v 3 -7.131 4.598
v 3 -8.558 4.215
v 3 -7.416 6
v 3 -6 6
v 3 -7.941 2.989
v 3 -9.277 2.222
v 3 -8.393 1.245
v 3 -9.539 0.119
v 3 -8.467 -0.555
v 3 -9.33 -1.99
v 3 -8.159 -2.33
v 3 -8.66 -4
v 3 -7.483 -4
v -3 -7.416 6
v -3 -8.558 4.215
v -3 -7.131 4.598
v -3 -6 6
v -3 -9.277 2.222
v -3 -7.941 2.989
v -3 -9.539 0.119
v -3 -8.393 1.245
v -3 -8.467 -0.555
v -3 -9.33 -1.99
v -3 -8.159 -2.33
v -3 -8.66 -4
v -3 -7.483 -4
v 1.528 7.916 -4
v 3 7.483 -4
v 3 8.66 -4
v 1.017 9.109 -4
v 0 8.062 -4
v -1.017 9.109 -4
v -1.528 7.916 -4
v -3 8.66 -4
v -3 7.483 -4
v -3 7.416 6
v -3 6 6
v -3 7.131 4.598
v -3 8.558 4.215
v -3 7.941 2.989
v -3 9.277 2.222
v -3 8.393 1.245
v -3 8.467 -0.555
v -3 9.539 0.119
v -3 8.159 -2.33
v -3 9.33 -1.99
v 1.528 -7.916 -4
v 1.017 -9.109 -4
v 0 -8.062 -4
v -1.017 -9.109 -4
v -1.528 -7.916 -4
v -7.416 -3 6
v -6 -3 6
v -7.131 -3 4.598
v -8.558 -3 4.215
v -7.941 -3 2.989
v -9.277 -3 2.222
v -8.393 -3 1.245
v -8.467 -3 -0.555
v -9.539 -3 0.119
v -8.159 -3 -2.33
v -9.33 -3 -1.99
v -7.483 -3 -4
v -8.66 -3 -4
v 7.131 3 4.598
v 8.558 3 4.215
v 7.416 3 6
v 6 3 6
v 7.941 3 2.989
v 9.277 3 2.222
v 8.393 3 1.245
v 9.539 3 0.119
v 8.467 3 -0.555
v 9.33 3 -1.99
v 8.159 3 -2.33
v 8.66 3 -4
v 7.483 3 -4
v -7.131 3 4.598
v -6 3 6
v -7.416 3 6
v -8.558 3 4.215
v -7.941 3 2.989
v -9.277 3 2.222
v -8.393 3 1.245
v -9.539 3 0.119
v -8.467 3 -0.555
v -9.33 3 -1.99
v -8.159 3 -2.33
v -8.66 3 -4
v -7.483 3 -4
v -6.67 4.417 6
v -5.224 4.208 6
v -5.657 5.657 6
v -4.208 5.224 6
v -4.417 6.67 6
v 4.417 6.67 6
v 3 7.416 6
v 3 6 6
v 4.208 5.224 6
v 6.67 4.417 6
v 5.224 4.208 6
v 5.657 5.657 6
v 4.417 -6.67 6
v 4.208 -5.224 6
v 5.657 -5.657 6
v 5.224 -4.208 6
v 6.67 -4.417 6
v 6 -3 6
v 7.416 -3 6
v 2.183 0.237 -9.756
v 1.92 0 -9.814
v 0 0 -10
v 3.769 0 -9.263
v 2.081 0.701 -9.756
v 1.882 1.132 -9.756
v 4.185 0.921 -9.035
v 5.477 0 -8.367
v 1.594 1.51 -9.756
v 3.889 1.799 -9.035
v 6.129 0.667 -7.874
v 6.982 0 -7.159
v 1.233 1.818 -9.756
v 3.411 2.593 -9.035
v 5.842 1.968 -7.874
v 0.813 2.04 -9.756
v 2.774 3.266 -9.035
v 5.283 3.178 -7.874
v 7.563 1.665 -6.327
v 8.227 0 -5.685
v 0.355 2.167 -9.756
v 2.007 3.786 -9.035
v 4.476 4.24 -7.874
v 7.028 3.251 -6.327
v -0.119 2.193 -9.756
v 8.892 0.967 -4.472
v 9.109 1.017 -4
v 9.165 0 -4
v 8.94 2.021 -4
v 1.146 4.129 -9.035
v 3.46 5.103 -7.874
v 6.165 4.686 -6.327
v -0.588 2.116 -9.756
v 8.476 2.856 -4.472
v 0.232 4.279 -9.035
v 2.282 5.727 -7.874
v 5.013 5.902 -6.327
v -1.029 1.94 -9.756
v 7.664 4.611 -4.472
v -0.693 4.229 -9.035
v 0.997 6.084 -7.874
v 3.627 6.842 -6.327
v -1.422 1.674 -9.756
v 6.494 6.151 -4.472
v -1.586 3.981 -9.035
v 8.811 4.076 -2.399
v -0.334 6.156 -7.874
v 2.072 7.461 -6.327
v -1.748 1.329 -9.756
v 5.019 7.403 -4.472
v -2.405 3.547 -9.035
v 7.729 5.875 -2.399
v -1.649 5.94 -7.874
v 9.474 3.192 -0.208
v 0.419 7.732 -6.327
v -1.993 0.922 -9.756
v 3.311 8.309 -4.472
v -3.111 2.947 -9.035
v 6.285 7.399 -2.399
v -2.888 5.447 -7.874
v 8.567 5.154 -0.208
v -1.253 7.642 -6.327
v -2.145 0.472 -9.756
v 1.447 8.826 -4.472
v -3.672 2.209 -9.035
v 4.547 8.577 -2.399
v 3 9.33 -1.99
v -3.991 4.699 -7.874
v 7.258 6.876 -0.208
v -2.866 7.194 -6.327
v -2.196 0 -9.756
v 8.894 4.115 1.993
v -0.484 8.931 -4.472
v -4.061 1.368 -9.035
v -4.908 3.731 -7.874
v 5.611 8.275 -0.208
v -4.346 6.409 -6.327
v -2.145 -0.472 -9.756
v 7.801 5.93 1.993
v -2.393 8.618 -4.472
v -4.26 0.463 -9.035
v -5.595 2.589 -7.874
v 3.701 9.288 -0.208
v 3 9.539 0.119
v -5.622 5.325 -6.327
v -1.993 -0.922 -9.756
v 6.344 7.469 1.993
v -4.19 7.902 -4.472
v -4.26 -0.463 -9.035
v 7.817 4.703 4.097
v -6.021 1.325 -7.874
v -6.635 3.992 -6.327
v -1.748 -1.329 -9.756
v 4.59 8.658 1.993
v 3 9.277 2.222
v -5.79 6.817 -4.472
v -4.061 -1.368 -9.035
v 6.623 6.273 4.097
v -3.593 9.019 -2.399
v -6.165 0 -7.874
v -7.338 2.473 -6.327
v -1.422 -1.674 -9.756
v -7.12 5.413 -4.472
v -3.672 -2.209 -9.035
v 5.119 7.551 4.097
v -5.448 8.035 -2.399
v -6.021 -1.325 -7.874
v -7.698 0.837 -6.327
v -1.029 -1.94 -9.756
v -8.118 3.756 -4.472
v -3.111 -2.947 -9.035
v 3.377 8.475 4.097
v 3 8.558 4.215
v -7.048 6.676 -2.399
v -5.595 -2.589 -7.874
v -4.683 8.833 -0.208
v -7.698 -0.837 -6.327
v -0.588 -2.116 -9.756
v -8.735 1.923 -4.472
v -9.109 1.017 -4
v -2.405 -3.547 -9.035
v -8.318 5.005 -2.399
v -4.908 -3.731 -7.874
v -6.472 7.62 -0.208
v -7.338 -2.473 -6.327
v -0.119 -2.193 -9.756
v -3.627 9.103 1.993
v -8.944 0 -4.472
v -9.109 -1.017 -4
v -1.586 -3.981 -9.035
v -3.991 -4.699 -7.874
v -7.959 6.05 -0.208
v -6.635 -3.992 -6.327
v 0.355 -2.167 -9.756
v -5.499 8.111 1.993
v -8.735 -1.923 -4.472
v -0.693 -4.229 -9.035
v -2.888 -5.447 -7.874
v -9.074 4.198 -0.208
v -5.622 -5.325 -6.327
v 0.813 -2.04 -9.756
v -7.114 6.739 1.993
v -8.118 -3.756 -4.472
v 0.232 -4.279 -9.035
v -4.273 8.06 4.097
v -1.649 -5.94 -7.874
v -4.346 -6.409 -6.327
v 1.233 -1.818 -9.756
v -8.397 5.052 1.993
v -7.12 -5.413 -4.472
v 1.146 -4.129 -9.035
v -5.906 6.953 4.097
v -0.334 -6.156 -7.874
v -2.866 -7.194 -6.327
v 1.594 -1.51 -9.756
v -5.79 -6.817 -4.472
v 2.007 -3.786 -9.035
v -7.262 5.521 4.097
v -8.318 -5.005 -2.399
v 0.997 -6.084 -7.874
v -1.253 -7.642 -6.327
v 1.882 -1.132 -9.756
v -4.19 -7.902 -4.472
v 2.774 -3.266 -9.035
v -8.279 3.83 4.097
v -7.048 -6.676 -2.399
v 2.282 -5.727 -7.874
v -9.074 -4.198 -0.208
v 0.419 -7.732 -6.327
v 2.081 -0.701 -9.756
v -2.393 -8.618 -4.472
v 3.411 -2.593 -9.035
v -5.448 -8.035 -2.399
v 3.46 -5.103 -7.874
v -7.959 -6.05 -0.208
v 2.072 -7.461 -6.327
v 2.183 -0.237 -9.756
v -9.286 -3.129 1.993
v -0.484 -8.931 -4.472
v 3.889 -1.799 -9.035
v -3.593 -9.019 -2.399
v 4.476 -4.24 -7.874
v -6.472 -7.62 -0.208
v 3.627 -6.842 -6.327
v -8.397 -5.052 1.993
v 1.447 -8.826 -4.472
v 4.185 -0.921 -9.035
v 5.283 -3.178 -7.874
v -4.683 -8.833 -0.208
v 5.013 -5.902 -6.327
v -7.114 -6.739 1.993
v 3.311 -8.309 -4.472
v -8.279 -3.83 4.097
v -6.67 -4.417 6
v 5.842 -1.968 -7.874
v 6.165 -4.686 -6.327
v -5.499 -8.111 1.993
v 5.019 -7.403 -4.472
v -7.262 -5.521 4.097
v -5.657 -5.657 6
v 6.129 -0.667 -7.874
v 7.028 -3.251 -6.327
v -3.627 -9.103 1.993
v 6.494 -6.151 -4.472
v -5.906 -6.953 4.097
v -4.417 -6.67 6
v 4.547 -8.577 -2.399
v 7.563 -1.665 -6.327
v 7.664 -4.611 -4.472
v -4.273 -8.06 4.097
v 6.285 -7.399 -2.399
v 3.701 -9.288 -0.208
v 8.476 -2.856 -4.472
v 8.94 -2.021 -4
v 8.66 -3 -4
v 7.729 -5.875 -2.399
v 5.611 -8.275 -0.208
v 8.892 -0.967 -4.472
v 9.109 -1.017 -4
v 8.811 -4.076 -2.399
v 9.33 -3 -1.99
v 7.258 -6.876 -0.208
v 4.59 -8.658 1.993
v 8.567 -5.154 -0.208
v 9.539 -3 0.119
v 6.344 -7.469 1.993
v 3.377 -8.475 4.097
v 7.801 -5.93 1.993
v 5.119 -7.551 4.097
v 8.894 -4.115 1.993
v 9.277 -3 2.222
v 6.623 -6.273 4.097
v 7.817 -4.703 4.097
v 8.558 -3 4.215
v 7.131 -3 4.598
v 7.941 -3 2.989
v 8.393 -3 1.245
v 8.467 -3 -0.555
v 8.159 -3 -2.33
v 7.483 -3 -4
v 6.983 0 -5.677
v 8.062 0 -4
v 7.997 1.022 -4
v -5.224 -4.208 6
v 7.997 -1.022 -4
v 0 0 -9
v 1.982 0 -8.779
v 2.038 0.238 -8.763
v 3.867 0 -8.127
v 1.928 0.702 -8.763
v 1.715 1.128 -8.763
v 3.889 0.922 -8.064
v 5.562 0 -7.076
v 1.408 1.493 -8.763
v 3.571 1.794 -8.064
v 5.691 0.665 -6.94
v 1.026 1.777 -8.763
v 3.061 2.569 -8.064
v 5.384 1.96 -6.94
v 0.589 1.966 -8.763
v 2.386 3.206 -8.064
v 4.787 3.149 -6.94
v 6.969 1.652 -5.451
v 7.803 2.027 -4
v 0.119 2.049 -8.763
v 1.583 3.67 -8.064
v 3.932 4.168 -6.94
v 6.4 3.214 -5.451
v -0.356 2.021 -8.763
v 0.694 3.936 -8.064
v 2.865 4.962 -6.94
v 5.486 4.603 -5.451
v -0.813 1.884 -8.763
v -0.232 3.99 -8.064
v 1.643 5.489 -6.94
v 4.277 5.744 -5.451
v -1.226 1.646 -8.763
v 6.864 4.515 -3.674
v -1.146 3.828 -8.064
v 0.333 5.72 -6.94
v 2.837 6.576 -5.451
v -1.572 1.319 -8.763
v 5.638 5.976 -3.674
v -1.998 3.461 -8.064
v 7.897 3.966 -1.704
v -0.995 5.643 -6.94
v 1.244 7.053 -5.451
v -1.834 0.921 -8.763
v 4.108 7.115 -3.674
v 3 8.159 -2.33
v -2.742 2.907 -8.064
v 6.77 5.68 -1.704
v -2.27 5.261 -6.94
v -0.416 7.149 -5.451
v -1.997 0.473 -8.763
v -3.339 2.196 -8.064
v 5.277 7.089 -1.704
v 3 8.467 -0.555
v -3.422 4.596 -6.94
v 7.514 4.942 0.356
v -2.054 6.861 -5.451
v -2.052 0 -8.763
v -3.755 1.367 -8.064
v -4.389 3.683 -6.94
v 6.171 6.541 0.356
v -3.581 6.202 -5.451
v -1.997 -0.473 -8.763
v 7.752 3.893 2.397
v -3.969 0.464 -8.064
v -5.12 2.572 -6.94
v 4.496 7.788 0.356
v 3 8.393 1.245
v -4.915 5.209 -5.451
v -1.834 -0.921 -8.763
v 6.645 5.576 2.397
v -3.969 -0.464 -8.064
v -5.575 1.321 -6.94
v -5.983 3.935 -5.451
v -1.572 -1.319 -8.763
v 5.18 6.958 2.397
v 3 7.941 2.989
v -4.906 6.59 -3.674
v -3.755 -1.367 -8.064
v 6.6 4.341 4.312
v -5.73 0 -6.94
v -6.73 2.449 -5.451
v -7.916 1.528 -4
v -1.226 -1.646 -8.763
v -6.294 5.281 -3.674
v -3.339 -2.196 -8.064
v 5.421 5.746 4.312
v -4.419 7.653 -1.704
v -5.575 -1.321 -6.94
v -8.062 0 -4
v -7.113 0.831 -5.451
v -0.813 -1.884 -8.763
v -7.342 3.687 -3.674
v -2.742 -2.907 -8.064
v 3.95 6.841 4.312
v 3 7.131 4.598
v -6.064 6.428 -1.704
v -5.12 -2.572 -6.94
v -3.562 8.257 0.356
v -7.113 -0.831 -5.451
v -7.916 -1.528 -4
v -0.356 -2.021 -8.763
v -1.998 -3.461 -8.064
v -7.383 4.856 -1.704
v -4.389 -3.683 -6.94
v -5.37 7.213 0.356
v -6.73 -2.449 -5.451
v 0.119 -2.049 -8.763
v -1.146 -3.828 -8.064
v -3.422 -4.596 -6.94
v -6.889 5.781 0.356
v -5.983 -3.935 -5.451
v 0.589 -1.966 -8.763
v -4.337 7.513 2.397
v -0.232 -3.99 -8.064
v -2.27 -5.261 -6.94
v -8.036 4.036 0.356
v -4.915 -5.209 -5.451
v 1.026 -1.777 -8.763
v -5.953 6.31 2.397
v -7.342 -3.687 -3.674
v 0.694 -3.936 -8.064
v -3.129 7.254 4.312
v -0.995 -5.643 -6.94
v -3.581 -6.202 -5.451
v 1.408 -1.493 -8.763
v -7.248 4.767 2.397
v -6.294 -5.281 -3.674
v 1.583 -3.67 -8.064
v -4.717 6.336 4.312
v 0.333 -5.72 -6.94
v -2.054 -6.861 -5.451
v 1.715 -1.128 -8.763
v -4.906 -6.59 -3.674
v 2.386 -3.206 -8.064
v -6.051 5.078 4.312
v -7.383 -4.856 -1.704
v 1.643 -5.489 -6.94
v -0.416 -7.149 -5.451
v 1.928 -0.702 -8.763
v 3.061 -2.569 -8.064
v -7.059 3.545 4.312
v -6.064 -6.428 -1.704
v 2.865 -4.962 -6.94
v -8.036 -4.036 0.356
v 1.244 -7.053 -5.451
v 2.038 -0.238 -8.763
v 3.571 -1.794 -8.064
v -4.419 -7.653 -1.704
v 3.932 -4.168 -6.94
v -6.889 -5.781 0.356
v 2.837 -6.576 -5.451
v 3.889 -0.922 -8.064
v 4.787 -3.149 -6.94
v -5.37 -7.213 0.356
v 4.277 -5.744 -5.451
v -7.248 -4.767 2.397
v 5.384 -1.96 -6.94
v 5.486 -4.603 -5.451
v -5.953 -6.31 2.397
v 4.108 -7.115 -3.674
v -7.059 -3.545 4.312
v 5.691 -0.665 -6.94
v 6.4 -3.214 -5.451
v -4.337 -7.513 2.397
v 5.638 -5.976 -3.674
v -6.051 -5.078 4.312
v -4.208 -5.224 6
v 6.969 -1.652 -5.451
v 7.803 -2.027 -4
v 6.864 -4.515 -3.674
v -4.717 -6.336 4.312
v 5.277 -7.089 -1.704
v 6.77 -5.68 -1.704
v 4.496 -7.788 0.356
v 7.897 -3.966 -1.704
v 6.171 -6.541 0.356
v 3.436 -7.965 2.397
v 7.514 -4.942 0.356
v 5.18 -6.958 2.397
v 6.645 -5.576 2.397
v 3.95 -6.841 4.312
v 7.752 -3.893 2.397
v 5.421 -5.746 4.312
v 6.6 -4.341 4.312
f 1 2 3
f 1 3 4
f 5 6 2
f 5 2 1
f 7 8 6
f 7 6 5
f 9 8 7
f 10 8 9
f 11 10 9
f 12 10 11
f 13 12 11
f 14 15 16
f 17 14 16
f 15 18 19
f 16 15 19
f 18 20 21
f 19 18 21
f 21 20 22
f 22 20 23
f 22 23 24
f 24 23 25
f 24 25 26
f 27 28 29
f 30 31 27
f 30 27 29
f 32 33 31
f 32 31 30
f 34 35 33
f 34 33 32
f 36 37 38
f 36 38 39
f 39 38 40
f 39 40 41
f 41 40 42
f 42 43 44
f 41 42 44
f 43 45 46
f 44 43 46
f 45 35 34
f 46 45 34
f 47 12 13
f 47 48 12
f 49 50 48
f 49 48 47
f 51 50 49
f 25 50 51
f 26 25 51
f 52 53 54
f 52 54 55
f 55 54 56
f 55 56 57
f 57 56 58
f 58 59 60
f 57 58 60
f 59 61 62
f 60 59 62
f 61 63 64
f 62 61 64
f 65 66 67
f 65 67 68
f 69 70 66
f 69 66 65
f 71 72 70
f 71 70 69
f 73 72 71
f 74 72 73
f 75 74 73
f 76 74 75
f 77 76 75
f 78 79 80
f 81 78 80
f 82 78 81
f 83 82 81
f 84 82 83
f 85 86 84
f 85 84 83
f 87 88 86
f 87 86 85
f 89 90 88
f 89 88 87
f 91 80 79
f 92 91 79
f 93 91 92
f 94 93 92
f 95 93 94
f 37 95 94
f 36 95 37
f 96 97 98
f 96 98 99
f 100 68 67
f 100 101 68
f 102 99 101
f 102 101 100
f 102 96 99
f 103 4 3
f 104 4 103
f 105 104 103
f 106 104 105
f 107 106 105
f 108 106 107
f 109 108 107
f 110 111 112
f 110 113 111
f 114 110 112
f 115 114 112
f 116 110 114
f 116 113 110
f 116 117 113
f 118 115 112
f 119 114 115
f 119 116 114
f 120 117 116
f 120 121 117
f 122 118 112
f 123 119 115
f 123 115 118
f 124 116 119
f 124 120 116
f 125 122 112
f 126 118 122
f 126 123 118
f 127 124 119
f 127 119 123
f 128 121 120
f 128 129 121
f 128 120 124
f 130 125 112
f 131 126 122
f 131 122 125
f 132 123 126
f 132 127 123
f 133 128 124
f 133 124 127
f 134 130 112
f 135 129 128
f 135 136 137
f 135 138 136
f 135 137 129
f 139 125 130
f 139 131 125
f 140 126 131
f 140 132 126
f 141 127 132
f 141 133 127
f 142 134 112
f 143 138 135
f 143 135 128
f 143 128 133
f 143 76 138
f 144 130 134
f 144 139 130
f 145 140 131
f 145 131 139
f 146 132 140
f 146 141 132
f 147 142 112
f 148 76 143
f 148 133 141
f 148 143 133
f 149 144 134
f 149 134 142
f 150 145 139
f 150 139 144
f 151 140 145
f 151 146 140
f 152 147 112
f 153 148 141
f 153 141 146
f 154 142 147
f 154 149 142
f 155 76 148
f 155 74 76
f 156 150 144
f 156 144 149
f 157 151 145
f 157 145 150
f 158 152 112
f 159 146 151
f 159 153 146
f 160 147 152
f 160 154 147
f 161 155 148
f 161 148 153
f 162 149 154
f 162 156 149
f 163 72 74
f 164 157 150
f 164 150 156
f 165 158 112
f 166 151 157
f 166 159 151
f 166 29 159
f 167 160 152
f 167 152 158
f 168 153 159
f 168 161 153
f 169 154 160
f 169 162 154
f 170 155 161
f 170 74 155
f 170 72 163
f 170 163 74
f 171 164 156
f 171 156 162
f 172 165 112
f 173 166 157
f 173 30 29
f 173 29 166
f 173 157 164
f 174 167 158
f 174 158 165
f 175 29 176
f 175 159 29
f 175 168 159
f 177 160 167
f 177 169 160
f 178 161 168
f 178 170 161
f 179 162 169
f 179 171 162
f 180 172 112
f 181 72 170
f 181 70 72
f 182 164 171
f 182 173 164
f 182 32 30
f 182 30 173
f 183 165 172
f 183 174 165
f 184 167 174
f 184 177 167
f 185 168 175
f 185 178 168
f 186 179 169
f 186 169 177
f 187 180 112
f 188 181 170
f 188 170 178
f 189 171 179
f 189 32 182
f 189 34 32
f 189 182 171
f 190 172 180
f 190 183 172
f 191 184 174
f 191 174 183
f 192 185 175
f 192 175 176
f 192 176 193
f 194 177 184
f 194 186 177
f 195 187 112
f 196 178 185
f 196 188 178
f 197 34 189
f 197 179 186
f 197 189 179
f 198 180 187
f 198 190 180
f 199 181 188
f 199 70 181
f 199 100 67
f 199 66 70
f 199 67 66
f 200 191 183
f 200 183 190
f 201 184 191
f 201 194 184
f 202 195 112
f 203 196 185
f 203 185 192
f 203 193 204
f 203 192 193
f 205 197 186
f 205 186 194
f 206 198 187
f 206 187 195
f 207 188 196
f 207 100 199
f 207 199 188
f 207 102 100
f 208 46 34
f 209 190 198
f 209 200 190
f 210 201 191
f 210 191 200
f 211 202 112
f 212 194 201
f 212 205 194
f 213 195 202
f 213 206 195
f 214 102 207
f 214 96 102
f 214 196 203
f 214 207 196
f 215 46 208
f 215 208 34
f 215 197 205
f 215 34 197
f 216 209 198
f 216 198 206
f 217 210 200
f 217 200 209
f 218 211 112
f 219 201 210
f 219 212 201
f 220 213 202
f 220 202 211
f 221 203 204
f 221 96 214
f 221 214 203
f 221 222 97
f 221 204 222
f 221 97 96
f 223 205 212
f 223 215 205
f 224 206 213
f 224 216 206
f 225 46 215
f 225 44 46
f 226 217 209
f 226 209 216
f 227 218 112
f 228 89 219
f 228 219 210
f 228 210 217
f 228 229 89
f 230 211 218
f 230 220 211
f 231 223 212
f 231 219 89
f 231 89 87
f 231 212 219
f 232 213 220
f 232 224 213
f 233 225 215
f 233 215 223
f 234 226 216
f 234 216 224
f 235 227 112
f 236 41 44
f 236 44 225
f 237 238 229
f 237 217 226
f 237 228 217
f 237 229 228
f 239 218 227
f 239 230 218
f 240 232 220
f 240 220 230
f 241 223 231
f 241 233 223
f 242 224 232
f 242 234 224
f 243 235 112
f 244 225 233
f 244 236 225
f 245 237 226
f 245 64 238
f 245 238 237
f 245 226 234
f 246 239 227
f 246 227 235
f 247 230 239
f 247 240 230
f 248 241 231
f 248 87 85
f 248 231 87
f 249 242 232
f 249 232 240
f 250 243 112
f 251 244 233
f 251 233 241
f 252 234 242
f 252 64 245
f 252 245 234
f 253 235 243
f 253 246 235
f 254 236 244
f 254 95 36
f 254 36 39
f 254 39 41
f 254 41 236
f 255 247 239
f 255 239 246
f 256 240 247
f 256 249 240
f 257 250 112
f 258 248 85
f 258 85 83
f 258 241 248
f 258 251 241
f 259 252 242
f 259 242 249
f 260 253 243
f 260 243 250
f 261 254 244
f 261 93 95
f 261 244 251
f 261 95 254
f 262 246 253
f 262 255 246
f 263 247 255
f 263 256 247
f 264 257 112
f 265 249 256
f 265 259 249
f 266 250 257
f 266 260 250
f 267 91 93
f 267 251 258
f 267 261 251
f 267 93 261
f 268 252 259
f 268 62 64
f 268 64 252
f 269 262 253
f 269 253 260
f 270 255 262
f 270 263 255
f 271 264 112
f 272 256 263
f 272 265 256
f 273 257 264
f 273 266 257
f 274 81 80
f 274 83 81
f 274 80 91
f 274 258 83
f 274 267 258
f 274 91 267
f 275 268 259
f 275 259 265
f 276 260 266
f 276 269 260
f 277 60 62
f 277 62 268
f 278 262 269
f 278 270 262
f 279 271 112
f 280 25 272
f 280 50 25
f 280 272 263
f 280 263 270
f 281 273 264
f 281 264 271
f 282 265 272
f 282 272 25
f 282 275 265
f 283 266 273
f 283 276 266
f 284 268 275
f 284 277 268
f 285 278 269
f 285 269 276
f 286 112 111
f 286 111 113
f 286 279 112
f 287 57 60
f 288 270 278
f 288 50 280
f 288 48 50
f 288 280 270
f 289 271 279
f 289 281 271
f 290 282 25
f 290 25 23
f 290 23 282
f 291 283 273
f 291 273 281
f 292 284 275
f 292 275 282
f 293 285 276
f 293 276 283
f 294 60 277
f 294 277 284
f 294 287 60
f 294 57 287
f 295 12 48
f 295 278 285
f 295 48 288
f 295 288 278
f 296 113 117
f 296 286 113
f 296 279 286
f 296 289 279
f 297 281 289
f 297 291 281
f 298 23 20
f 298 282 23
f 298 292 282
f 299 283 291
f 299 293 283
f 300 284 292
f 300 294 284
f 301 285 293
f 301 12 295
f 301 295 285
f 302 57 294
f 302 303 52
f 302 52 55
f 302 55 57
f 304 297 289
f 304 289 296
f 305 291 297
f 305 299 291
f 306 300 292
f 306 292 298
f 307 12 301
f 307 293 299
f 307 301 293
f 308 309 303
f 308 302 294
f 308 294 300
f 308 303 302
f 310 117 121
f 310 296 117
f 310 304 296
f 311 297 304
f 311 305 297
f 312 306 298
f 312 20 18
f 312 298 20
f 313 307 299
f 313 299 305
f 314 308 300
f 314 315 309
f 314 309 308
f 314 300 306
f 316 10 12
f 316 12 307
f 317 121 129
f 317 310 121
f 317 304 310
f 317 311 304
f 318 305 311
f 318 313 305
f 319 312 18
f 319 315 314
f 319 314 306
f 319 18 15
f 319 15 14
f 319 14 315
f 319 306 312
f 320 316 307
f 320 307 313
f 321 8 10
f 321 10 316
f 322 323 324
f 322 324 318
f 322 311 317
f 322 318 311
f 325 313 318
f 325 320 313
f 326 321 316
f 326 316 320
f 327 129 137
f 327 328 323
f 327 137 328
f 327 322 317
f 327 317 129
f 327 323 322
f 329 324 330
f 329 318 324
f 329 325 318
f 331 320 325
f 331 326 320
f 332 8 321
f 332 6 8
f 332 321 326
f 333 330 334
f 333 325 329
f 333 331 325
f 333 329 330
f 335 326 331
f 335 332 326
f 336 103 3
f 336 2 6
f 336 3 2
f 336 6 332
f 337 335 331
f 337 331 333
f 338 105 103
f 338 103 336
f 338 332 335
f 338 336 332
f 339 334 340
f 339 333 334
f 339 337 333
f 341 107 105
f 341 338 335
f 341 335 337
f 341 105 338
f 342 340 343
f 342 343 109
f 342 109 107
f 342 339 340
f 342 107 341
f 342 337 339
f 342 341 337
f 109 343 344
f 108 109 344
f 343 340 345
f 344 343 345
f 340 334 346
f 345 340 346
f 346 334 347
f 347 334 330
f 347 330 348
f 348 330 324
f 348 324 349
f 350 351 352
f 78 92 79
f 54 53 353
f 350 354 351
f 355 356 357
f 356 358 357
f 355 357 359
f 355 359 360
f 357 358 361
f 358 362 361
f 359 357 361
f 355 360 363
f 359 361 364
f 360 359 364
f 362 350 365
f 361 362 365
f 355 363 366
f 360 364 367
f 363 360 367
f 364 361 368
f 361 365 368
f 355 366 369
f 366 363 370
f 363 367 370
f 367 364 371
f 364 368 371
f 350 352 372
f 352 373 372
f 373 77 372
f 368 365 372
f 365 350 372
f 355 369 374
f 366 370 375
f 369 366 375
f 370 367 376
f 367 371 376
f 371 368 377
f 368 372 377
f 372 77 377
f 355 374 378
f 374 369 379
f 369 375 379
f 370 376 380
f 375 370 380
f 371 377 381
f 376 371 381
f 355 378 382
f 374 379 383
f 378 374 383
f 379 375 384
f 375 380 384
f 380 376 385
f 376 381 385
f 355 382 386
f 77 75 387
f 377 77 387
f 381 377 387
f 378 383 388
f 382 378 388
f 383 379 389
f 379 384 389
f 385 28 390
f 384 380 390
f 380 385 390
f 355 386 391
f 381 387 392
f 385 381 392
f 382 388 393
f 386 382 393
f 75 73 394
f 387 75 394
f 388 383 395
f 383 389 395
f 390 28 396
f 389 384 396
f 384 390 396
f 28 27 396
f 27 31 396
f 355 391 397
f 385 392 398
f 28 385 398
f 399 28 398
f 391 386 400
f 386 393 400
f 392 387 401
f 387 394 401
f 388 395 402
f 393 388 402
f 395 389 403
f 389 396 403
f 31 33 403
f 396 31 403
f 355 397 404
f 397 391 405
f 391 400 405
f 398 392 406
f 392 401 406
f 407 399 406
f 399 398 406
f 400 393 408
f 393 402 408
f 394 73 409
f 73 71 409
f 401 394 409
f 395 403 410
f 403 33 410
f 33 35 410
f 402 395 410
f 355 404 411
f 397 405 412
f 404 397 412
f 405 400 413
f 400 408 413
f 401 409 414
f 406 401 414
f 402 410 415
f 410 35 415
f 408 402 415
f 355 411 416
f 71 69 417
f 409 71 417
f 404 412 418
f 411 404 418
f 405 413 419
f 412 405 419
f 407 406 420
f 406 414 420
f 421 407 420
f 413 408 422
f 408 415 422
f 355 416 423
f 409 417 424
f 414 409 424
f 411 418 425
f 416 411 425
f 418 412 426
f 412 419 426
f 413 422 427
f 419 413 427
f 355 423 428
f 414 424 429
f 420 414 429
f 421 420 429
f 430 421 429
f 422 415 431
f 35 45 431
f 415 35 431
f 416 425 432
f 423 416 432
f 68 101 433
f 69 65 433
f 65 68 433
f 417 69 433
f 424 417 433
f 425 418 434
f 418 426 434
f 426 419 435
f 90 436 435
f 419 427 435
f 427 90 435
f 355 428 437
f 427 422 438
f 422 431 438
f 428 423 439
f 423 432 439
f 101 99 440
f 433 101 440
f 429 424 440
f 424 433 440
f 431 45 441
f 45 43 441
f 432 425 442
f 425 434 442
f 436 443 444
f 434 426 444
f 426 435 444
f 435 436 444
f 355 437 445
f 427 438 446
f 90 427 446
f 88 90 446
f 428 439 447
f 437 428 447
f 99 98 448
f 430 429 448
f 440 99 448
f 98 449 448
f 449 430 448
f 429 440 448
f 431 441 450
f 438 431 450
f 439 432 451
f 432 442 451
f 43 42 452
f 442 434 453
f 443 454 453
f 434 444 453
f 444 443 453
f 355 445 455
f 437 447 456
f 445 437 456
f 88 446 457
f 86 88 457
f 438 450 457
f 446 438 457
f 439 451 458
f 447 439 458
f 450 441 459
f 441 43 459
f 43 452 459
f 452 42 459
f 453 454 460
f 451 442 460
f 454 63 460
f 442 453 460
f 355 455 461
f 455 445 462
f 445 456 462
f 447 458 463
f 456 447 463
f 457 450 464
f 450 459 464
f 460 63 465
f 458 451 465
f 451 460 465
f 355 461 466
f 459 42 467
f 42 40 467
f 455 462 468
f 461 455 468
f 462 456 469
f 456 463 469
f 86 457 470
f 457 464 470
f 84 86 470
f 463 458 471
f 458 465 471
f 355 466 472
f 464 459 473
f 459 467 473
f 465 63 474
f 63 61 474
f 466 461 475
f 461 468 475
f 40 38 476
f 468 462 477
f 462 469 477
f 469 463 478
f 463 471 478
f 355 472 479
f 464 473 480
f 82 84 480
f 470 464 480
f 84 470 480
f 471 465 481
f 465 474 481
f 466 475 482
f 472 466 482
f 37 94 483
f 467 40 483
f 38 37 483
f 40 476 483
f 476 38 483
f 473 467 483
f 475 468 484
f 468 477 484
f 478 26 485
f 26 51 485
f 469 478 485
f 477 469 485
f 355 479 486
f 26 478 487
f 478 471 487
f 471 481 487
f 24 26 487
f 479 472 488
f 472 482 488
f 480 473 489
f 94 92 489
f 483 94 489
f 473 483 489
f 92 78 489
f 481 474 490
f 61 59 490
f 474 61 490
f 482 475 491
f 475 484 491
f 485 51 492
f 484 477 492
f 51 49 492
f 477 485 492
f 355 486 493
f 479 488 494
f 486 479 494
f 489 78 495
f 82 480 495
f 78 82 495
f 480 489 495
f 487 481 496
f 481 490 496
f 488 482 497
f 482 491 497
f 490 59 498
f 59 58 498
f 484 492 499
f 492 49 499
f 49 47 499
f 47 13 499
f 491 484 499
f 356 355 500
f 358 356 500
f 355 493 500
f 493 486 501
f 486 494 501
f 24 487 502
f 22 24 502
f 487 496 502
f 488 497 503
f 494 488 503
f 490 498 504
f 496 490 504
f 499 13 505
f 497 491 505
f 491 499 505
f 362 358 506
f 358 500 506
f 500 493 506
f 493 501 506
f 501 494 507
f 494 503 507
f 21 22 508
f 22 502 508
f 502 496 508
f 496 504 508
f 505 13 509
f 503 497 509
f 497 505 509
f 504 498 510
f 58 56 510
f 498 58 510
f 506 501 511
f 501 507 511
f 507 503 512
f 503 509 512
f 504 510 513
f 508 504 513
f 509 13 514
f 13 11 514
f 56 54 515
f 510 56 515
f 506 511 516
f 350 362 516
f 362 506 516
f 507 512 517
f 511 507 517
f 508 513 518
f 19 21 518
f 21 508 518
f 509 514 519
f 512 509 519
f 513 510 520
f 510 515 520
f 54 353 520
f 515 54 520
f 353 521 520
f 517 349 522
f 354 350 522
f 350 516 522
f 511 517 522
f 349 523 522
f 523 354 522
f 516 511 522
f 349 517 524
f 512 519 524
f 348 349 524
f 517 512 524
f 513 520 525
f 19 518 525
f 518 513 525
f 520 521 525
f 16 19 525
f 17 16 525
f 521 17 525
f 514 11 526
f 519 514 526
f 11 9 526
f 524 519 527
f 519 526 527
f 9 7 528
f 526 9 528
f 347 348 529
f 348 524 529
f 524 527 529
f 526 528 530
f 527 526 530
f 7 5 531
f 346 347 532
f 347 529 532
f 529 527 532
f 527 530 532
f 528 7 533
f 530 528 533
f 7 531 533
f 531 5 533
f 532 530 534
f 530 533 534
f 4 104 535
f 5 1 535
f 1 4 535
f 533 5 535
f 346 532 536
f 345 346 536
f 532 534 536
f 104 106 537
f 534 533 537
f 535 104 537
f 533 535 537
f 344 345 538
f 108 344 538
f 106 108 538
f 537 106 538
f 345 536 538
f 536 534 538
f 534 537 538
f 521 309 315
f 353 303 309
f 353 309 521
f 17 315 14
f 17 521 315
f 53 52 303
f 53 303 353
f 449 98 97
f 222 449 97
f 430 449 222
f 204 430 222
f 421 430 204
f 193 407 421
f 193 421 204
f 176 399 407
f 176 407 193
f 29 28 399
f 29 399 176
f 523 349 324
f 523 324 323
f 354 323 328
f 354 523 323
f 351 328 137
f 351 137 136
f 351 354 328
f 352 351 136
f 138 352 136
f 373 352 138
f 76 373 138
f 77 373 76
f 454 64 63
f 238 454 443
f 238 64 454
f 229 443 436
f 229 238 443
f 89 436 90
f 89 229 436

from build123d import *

# Parameters (mm, degrees)
BOX004_W               = 6
BOX004_H               = 20
BOX004_DEPTH           = 20
BOX004_PLACEMENT_ANGLE = 90
BOX003_W               = 6
BOX003_H               = 20
BOX003_DEPTH           = 20
BOX001_W               = 20
BOX001_H               = 20
BOX001_DEPTH           = 20
THICKNESS_T            = -1


with BuildPart() as cube004:
    # Box004 → Box004 (new body)
    with BuildSketch(Plane.XY):
        with Locations((3, 10)):
            Rectangle(BOX004_W, BOX004_H)
    extrude(amount=BOX004_DEPTH)


with BuildPart() as cube004_1:
    # Box004 placement: moved
    add(cube004.part.moved(Location((10, -3, -4))).rotate(Axis((10, -3, -4), (0, 0, 1)), BOX004_PLACEMENT_ANGLE))


with BuildPart() as fusion:
    # Box003 → Box003 (new body)
    with BuildSketch(Plane(origin=(-3, -10, -4), x_dir=(1, 0, 0), z_dir=(0, 0, 1))):
        with Locations((3, 10)):
            Rectangle(BOX003_W, BOX003_H)
    extrude(amount=BOX003_DEPTH)

    # Fusion: union Cube004
    add(cube004_1.part)


with BuildPart() as cube001:
    # Box001 → Box001 (new body)
    with BuildSketch(Plane(origin=(-10, -10, 6), x_dir=(1, 0, 0), z_dir=(0, 0, 1))):
        with Locations((10, 10)):
            Rectangle(BOX001_W, BOX001_H)
    extrude(amount=BOX001_DEPTH)


with BuildPart() as cut001:
    # Sphere → Sphere (revolve)
    with BuildSketch(Plane.XZ):
        with BuildLine():
            ThreePointArc((0, -10), (10, 0), (0, 10))
            Line((0, 10), (0, -10))
        make_face()
    revolve(axis=Axis((0, 0, 0), (0, 0, 1)))

    # Cut: cut Cube001
    add(cube001.part, mode=Mode.SUBTRACT)

    # Thickness
    thickness_openings = [cut001.faces().sort_by_distance(p)[0] for p in [
        (0, 0, 6),
    ]]
    offset(amount=THICKNESS_T, openings=thickness_openings, kind=Kind.INTERSECTION)

    # Cut001: cut Fusion
    add(fusion.part, mode=Mode.SUBTRACT)


solid = cut001.part
